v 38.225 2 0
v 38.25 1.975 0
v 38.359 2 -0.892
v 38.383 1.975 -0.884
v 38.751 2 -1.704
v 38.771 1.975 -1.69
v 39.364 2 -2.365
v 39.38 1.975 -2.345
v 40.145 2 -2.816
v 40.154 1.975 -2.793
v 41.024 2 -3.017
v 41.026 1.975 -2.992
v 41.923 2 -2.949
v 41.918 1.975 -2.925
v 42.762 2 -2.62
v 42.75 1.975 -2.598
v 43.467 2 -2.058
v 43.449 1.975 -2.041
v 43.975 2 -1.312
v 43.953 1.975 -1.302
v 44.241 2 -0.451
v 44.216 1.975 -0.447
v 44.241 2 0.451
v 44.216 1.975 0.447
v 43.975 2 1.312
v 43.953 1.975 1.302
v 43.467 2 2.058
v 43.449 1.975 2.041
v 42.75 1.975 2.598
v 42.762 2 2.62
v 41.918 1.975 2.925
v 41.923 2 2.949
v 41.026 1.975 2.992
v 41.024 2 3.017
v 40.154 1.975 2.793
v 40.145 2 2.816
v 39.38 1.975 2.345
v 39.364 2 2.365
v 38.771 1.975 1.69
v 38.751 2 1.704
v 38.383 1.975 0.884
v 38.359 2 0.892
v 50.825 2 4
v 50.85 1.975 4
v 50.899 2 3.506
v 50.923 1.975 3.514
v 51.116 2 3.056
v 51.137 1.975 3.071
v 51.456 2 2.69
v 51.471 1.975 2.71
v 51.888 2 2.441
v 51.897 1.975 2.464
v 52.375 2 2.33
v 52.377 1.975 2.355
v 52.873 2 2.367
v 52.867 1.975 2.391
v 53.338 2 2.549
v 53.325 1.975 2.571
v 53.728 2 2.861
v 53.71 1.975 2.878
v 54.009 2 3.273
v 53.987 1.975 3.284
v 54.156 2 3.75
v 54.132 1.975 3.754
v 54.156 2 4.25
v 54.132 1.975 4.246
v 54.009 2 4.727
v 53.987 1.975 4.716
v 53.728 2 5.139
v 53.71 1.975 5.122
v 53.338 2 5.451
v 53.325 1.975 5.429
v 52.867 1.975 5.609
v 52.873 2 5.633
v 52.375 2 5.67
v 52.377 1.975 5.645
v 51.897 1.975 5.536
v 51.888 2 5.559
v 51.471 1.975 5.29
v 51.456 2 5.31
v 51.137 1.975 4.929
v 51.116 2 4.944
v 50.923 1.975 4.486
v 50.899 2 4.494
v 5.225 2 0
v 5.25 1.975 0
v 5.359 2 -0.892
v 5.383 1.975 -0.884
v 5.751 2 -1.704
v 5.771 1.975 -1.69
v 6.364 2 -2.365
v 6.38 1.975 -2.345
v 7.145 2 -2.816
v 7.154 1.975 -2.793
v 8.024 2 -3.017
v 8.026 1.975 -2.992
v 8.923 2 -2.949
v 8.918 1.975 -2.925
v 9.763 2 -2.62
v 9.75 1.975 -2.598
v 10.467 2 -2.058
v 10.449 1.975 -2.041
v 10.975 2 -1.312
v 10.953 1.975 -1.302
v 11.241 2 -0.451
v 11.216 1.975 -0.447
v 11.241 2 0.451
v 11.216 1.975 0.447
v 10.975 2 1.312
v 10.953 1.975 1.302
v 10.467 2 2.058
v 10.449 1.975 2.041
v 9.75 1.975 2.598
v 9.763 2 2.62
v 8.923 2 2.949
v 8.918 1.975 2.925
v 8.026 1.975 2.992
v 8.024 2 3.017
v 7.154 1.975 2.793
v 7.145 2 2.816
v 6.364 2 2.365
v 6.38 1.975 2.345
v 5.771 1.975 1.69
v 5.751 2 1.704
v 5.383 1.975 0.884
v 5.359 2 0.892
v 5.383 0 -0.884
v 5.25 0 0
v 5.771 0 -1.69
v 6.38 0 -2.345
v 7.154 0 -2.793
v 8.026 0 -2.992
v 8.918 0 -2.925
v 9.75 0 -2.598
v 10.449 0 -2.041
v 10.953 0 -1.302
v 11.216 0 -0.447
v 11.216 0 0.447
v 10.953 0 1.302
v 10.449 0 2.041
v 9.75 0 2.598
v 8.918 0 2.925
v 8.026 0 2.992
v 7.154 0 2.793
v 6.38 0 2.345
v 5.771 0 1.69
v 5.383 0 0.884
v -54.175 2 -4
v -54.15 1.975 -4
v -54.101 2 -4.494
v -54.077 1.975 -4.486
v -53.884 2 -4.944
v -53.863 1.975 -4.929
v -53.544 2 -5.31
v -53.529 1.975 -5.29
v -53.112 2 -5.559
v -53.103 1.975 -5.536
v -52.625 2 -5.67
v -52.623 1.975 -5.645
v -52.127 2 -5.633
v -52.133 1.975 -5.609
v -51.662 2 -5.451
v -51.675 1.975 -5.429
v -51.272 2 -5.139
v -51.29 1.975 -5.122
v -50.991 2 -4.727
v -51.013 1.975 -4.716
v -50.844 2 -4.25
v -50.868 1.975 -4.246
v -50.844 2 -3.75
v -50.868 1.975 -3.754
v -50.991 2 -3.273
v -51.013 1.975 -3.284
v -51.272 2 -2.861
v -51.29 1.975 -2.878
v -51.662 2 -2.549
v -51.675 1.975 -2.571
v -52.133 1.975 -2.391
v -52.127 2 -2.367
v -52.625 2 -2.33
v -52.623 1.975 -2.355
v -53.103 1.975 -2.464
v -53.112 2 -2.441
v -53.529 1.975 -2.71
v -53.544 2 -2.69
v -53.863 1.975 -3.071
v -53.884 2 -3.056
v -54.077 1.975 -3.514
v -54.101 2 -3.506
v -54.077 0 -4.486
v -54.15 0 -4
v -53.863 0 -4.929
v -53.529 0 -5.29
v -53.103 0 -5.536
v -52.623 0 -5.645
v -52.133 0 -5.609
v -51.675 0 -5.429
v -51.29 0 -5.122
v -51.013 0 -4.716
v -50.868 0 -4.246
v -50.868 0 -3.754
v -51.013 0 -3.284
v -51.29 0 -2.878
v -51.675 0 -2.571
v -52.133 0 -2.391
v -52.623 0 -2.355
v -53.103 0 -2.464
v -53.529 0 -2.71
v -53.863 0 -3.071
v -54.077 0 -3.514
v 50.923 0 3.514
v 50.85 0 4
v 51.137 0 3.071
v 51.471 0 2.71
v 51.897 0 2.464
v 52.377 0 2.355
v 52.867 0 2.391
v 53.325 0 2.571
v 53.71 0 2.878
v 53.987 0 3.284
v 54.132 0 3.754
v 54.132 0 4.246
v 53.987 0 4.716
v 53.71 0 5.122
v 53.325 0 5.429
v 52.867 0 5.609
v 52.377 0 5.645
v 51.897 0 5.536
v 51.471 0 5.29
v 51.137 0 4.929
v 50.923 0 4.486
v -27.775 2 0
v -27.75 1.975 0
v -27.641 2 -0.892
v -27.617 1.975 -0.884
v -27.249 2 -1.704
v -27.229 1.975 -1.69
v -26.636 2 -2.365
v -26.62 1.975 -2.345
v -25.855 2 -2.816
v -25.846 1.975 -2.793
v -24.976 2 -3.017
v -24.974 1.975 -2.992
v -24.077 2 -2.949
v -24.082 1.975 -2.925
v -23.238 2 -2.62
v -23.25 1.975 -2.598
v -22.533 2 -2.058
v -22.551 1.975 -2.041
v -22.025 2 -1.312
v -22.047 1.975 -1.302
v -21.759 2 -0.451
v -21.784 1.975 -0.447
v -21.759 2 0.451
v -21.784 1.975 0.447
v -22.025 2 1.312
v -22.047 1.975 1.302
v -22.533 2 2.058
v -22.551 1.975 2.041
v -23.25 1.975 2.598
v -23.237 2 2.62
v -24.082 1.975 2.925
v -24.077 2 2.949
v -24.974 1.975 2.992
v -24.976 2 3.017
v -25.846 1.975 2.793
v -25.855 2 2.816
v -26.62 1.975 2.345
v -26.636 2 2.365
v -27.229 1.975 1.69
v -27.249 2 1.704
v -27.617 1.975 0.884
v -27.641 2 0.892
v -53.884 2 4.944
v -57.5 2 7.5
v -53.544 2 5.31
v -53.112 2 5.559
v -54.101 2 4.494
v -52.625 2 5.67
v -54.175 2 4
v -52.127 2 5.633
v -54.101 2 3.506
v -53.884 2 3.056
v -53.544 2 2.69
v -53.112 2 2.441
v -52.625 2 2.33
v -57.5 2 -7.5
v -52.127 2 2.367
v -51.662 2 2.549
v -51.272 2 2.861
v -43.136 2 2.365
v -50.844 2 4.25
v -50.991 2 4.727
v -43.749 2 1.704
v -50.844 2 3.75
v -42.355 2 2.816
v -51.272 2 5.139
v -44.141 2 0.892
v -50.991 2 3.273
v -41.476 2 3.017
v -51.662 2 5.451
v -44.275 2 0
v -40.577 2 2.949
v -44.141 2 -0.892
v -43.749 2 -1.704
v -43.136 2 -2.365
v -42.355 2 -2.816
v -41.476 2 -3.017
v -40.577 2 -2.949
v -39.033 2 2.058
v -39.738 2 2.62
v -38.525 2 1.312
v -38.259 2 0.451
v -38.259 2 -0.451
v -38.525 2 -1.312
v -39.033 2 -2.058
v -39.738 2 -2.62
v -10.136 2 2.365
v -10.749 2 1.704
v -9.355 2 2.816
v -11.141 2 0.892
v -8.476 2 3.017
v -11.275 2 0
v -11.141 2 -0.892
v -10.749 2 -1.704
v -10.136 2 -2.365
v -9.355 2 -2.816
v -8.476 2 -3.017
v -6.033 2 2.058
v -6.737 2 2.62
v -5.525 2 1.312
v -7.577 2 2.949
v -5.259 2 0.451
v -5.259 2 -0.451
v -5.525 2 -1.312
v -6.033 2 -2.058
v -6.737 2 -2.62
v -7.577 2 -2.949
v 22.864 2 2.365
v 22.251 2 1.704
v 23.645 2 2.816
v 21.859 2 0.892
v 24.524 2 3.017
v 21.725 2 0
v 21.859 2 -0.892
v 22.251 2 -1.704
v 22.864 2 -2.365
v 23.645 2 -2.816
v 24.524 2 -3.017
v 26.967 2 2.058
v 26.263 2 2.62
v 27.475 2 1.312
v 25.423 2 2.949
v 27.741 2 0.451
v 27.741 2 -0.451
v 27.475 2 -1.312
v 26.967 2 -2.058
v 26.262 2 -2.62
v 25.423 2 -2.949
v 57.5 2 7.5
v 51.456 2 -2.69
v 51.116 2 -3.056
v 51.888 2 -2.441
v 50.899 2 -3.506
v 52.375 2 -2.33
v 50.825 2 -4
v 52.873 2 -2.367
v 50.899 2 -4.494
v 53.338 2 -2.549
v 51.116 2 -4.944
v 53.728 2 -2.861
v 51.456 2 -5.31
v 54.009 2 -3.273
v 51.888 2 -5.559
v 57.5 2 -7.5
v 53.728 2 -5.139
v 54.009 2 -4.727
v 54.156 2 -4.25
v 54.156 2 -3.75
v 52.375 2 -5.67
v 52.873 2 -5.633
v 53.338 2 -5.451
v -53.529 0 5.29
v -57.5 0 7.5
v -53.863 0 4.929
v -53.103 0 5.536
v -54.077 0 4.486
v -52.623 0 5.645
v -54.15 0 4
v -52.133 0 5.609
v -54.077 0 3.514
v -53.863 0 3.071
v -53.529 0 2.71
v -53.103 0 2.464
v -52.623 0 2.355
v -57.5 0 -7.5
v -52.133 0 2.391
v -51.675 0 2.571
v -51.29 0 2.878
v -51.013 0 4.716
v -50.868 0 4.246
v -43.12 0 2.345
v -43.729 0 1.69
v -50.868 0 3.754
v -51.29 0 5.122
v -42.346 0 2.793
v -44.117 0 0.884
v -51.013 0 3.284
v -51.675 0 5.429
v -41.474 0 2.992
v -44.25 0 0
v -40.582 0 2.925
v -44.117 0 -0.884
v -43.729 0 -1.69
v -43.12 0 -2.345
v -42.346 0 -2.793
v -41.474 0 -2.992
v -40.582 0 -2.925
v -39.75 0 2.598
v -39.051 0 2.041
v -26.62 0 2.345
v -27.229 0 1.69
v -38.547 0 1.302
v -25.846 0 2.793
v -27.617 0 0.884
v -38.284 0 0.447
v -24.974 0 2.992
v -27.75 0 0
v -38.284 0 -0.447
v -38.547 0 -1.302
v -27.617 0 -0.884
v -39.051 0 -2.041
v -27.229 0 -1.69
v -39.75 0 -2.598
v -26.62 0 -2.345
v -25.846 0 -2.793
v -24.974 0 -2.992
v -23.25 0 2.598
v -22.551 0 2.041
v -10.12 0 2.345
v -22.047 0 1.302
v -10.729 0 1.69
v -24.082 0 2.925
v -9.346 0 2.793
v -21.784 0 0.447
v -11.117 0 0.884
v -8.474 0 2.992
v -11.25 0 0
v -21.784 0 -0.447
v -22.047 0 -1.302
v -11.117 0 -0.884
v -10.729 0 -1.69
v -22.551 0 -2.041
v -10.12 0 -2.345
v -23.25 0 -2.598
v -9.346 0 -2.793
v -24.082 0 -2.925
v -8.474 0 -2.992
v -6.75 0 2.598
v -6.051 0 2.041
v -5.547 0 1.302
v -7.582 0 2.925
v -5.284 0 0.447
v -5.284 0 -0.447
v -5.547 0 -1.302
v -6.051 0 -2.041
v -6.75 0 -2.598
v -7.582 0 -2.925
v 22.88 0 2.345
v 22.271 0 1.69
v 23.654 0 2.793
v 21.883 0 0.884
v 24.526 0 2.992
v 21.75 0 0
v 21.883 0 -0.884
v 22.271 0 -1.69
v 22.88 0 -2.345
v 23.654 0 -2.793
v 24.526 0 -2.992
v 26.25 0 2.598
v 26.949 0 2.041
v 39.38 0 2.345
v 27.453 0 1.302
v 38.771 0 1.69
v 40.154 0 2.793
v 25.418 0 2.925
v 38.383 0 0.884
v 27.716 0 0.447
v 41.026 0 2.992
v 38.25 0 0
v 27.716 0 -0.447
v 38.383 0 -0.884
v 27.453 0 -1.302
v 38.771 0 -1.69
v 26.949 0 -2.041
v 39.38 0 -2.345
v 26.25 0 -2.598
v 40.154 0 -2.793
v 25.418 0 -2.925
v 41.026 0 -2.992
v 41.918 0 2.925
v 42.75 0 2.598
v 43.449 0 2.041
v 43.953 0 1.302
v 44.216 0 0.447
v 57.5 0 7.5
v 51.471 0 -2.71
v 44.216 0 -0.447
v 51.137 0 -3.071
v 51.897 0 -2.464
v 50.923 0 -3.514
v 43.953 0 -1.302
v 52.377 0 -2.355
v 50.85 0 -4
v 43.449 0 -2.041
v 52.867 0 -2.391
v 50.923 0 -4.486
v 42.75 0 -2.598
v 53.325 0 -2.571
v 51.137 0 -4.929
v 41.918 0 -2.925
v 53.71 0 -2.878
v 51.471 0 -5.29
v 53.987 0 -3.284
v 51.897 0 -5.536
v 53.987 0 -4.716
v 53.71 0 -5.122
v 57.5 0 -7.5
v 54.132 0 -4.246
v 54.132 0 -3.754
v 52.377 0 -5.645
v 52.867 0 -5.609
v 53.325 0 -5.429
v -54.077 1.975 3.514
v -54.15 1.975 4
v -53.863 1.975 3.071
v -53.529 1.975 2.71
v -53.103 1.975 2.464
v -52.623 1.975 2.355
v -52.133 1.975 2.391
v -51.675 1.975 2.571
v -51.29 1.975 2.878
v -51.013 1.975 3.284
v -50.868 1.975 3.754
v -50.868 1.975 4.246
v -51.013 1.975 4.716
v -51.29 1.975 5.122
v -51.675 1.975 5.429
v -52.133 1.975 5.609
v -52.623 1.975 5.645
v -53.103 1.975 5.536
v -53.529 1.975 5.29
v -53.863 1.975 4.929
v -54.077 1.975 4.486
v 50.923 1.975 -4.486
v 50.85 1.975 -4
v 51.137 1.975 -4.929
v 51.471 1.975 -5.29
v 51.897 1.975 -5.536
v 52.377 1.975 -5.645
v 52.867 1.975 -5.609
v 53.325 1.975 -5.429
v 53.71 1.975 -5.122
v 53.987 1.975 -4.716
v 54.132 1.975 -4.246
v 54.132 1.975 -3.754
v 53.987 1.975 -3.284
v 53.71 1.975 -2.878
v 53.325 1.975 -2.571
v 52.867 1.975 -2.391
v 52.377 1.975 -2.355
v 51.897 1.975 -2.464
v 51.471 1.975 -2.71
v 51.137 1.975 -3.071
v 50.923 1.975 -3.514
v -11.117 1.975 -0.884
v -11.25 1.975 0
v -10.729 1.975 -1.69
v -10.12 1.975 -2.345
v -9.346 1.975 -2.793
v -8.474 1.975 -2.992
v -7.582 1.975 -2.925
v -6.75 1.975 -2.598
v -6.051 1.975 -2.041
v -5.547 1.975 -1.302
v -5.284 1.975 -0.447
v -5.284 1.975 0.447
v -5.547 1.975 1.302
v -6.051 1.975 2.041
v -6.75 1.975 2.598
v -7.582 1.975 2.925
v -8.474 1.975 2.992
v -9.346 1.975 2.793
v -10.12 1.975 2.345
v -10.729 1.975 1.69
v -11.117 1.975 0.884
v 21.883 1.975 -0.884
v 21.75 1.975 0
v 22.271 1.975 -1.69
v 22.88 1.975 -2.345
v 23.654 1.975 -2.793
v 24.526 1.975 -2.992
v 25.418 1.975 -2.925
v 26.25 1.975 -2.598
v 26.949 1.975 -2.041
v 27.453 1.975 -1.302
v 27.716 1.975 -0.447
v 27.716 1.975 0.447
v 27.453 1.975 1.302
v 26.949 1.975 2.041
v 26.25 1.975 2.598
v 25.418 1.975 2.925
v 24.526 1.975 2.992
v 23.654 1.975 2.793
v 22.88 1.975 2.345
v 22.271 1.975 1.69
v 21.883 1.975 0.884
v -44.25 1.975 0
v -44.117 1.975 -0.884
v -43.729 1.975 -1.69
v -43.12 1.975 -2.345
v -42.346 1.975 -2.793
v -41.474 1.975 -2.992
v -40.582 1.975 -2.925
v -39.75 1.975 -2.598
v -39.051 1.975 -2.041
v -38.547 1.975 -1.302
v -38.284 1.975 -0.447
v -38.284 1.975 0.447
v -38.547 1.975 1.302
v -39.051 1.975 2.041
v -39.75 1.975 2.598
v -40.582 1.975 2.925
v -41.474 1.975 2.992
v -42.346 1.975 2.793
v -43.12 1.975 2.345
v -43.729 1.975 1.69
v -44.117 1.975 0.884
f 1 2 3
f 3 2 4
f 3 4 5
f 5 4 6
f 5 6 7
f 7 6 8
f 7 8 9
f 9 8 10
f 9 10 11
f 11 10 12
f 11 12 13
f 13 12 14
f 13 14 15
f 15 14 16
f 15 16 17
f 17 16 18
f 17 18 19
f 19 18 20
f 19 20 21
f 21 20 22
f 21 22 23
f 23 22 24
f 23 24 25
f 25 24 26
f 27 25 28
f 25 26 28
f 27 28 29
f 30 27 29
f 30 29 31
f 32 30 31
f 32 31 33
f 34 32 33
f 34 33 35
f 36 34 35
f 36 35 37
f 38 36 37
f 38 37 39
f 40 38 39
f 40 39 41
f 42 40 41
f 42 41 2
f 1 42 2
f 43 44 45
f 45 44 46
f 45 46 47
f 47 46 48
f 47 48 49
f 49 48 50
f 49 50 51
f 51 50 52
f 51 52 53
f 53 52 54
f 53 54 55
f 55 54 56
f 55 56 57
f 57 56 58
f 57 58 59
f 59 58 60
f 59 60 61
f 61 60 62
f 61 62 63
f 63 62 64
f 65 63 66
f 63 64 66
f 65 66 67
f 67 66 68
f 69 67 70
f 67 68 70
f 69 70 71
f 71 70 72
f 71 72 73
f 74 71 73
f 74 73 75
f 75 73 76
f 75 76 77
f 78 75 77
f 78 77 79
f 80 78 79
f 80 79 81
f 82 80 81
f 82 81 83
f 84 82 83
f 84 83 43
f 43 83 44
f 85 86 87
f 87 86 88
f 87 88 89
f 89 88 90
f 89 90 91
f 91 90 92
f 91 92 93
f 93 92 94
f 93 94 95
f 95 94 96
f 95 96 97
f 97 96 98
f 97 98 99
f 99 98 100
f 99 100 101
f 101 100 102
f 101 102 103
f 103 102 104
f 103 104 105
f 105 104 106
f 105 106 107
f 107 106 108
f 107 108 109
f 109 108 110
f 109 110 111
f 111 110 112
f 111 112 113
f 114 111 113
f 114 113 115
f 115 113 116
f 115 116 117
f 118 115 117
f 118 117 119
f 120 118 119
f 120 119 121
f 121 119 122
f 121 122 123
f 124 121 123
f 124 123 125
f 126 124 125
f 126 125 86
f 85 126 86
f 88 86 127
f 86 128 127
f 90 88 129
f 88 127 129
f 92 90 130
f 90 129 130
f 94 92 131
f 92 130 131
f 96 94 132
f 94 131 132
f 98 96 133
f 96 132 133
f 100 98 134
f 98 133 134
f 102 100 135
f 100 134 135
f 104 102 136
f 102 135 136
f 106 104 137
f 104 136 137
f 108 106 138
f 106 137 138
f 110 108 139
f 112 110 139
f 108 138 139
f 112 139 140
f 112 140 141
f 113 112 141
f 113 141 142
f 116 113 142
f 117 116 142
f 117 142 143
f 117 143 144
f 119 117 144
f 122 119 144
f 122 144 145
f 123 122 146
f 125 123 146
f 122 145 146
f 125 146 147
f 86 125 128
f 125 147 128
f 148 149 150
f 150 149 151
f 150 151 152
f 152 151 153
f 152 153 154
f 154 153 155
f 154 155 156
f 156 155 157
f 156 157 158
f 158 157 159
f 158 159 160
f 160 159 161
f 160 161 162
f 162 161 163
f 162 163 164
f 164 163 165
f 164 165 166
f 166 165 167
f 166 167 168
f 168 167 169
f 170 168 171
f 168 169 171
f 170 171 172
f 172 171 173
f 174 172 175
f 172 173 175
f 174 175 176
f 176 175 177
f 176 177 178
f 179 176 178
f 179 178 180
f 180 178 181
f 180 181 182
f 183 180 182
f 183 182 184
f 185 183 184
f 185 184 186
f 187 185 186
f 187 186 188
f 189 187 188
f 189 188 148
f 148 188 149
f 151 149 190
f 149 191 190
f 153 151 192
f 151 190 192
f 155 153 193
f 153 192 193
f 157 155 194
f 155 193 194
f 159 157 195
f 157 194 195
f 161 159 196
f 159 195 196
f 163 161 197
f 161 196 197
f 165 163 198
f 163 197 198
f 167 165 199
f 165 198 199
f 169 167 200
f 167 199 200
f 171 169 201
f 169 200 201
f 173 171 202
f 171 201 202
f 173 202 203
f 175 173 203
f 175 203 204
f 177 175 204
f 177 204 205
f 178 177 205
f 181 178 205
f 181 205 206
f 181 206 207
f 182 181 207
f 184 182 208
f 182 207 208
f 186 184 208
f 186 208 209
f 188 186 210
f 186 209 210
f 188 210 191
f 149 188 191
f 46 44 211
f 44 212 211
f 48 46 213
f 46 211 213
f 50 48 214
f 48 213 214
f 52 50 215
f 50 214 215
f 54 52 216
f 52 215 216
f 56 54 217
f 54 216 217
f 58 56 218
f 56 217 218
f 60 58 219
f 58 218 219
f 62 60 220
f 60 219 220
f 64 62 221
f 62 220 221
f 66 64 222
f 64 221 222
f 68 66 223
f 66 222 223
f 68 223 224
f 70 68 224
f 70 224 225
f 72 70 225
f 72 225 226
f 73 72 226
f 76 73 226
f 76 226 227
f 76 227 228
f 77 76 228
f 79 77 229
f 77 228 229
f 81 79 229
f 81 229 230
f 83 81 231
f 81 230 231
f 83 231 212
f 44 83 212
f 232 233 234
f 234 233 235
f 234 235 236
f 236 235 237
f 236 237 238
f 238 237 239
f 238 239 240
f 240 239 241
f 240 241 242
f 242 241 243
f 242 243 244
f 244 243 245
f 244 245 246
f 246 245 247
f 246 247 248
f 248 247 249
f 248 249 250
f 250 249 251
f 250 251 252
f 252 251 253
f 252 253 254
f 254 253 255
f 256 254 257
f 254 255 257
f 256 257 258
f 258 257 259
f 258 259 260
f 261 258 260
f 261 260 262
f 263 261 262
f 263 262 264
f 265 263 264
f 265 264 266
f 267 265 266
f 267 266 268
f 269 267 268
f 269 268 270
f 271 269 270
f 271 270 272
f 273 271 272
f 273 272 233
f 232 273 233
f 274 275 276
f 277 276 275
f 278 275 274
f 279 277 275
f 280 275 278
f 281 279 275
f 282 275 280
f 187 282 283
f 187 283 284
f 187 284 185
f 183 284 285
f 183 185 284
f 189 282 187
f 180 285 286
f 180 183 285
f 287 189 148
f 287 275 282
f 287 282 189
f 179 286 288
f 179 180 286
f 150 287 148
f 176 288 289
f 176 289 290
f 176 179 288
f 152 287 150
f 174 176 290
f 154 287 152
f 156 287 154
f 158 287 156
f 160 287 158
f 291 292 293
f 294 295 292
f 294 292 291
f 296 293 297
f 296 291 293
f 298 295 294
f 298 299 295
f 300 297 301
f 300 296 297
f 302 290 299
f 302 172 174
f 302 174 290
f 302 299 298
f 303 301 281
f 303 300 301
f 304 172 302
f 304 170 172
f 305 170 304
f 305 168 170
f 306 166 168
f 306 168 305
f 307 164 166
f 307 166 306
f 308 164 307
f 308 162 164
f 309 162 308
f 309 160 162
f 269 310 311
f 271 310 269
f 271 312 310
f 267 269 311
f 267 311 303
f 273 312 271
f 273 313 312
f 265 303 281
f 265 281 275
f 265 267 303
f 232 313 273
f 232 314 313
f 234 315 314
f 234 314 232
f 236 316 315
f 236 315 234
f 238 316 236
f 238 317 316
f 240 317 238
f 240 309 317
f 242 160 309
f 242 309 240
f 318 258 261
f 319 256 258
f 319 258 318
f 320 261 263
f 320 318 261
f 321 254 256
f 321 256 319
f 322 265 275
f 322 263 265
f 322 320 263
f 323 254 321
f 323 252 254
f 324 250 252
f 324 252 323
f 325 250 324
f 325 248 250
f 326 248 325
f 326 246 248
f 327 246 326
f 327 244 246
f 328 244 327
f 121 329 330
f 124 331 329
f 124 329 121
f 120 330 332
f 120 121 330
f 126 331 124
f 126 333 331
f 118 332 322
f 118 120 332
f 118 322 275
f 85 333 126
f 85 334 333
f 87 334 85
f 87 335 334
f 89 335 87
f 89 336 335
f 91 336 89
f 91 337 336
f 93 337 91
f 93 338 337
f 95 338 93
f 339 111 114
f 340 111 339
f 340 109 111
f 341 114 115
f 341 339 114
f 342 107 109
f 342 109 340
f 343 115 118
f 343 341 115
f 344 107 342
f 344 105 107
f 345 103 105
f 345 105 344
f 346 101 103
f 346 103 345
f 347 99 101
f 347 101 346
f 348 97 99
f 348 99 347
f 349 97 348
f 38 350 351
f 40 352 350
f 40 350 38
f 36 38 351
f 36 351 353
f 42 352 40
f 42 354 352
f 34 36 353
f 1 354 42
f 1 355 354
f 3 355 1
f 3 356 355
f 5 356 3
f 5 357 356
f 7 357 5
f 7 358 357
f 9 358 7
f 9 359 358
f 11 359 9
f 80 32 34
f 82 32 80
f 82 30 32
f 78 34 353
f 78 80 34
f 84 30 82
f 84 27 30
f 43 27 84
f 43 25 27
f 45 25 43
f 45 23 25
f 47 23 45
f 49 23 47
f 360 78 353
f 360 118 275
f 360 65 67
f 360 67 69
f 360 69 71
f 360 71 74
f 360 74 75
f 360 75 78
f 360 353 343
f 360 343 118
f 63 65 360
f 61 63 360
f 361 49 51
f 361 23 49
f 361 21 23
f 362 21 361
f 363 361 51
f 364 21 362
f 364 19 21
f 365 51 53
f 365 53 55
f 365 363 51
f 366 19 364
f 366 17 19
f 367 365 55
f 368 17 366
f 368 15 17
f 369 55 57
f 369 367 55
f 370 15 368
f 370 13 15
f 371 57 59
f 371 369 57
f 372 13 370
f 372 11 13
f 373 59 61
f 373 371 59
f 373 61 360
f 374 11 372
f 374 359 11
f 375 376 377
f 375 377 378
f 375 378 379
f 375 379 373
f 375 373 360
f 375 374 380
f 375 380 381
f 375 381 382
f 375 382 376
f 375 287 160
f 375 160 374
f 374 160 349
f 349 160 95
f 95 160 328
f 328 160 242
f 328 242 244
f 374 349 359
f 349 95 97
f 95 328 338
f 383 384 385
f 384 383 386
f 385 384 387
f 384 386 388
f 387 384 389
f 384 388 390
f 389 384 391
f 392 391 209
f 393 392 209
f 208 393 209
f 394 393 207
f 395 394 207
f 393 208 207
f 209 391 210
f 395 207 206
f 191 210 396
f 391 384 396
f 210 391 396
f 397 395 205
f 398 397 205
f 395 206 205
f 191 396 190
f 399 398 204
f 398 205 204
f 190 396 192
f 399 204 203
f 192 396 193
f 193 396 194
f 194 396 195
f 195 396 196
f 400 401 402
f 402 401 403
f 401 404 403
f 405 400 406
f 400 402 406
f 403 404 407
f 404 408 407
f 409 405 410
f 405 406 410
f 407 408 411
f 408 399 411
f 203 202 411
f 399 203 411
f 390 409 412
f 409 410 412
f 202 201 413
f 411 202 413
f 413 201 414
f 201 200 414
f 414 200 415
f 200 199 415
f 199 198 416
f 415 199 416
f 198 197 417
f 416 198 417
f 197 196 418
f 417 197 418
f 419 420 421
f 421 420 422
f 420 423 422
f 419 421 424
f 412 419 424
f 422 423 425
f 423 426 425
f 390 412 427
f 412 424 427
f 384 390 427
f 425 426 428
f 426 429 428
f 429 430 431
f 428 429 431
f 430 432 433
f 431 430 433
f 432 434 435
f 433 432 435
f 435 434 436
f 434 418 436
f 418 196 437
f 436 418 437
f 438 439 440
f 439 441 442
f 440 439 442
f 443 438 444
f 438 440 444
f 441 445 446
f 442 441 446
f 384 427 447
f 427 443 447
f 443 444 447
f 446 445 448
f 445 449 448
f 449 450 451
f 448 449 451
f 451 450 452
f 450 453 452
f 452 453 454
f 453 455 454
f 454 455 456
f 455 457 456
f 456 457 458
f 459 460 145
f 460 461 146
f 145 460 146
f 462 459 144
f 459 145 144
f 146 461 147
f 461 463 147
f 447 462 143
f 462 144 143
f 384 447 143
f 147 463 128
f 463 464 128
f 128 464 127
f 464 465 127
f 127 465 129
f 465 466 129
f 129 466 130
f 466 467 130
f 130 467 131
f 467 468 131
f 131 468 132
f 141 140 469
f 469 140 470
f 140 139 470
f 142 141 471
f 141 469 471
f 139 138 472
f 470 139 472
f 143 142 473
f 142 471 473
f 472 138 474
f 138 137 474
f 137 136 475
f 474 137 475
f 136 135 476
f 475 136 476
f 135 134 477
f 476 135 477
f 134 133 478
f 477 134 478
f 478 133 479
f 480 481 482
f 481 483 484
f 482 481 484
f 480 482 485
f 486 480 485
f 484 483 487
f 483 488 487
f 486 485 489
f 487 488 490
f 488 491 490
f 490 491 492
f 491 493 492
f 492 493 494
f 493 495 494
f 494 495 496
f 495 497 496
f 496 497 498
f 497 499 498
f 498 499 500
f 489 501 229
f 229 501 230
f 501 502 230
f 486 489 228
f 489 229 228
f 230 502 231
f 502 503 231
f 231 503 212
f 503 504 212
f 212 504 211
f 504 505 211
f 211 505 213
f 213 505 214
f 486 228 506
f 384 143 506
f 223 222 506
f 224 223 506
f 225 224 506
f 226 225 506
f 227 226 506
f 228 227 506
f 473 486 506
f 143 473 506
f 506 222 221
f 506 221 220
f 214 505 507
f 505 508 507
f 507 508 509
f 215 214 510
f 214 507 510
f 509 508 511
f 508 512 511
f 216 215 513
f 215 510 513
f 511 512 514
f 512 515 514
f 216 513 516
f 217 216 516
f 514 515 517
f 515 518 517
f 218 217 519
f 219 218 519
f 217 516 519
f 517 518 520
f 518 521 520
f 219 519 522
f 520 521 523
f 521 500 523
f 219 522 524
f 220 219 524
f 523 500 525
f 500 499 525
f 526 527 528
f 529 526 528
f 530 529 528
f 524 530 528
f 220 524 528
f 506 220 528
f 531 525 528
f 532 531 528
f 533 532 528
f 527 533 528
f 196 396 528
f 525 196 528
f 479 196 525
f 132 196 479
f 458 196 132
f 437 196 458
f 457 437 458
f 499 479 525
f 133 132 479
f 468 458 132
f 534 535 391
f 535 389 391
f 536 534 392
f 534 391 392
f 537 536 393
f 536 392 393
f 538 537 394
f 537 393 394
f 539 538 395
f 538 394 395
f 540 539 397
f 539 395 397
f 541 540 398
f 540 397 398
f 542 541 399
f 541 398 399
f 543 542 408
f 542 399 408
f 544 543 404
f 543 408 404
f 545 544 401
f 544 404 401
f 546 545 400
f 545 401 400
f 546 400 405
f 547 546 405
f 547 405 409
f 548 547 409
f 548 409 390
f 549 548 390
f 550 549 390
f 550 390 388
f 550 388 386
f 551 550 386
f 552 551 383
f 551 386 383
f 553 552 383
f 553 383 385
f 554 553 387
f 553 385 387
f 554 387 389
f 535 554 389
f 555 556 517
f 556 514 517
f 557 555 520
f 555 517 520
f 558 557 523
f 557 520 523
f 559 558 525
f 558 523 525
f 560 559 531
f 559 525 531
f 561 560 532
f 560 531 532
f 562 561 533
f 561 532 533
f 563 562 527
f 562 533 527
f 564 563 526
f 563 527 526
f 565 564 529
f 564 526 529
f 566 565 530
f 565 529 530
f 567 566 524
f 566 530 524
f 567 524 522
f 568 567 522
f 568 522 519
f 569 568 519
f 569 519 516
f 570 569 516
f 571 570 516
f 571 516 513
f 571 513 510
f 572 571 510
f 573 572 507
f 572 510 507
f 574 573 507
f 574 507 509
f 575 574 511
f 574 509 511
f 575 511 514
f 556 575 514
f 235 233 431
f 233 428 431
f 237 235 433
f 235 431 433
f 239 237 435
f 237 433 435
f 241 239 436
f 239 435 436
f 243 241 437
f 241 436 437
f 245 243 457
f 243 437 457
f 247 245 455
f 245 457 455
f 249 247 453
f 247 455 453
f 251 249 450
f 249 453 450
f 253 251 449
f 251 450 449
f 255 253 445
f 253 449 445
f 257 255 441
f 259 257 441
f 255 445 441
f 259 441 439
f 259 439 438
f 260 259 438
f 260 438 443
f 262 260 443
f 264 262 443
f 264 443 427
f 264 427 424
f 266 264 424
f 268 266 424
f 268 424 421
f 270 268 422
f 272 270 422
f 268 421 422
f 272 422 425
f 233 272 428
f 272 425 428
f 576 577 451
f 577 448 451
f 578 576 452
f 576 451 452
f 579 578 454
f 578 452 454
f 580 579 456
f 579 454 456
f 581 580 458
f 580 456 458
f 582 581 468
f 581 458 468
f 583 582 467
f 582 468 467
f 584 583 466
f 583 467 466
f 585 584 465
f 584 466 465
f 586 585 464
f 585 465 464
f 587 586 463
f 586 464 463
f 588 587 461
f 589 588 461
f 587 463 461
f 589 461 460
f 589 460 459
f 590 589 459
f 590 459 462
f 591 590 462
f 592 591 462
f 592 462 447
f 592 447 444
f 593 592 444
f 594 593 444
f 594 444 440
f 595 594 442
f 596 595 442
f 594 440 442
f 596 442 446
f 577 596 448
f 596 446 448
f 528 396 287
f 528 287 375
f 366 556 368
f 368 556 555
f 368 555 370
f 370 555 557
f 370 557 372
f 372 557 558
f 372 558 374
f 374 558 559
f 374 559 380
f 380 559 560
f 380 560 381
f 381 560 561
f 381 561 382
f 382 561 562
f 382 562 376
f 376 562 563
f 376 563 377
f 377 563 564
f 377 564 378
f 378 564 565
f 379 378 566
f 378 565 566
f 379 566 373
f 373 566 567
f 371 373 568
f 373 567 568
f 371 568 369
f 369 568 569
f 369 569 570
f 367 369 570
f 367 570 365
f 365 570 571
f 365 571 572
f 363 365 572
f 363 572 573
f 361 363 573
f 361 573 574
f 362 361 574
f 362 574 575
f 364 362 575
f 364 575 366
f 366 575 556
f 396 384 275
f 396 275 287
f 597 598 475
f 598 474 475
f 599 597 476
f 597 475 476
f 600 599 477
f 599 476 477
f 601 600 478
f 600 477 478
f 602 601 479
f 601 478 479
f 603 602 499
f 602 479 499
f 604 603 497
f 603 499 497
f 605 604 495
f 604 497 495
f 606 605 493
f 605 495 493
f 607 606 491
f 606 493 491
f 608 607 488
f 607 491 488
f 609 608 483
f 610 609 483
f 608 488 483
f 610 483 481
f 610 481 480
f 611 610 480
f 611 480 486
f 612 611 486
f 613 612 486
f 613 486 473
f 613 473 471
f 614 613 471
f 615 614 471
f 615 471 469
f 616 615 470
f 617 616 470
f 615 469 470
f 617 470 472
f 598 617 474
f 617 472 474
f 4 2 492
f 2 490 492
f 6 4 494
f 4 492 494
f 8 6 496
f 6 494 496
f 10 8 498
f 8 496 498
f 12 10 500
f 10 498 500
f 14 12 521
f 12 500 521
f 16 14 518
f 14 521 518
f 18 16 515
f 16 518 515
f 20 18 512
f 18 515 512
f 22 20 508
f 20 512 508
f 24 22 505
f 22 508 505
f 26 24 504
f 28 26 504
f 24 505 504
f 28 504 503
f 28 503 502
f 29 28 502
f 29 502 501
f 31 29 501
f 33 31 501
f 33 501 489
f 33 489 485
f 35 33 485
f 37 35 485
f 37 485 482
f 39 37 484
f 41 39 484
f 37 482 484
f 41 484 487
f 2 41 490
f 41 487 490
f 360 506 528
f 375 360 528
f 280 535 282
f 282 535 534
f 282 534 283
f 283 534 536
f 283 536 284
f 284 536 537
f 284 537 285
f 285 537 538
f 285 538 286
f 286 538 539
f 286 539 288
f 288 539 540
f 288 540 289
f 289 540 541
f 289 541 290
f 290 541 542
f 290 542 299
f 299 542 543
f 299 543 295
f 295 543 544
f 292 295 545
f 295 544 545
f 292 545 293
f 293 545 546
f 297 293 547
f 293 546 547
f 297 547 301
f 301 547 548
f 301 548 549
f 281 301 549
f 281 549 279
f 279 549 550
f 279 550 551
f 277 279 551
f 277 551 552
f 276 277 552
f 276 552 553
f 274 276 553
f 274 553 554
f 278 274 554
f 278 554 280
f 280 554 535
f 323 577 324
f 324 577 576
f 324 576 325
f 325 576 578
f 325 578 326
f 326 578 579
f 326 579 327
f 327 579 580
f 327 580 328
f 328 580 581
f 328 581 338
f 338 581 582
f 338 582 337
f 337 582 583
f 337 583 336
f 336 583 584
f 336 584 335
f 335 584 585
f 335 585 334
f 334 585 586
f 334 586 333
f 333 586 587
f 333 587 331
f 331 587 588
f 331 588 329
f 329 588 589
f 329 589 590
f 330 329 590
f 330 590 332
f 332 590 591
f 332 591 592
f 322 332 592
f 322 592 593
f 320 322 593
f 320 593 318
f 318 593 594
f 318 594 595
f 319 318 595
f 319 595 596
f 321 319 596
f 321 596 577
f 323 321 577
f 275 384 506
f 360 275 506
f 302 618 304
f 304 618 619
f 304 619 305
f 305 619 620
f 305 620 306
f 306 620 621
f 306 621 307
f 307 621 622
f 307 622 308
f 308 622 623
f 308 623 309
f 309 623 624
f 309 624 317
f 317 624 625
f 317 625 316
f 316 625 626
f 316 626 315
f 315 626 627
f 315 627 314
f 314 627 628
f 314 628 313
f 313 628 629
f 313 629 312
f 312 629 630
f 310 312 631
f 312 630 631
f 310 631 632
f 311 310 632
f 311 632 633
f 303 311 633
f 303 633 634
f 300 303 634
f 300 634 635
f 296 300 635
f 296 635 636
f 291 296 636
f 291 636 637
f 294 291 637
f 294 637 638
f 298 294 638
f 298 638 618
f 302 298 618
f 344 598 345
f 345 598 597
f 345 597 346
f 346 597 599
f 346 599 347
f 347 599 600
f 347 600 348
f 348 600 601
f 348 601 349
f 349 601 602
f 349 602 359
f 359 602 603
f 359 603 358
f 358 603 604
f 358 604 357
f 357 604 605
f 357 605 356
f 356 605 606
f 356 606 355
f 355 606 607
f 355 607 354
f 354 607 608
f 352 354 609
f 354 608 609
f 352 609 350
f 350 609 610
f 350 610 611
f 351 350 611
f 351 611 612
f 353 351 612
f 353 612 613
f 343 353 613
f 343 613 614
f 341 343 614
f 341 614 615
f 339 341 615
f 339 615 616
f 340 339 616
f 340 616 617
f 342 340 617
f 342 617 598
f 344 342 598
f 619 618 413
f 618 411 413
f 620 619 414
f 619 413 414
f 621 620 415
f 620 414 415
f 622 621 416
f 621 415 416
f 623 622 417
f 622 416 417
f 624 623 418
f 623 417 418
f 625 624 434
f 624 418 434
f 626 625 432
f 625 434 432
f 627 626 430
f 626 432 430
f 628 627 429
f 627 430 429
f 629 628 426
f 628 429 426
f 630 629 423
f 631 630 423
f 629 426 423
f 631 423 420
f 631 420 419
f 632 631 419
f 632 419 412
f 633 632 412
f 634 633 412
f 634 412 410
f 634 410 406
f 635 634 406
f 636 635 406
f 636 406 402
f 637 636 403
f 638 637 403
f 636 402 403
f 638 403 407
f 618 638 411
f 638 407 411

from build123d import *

# Parameters (mm, degrees)
SKETCH1_W                            = 115
SKETCH1_H                            = 15
BOSS_EXTRUDE1_DEPTH                  = 2
F_3_3_3_3_DIAMETER_HOLE1_D           = 3.3
F_3_3_3_3_DIAMETER_HOLE1_DEPTH       = 15
F_3_3_3_3_DIAMETER_HOLE1_CSINK_D     = 3.35
F_3_3_3_3_DIAMETER_HOLE1_CSINK_ANGLE = 90
F_3_3_3_3_DIAMETER_HOLE1_TIP         = 0.991420021
F_6_0_6_DIAMETER_HOLE1_D             = 6
F_6_0_6_DIAMETER_HOLE1_DEPTH         = 15
F_6_0_6_DIAMETER_HOLE1_CSINK_D       = 6.05
F_6_0_6_DIAMETER_HOLE1_CSINK_ANGLE   = 90
F_6_0_6_DIAMETER_HOLE1_TIP           = 1.802581857


with BuildPart() as part:
    # Sketch1 → Boss-Extrude1 (new body)
    with BuildSketch(Plane(origin=(0, 0, 0), x_dir=(1, 0, 0), z_dir=(0, 1, 0))):
        Rectangle(SKETCH1_W, SKETCH1_H)
    extrude(amount=BOSS_EXTRUDE1_DEPTH)

    # Ø3.3 (3.3) Diameter Hole1
    with Locations(Plane(origin=(0, 2, 0), x_dir=(1, 0, 0), z_dir=(0, 1, 0))):
        with Locations((52.5, -4), (-52.5, 4), (-52.5, -4), (52.5, 4)):
            CounterSinkHole(F_3_3_3_3_DIAMETER_HOLE1_D / 2, F_3_3_3_3_DIAMETER_HOLE1_CSINK_D / 2, depth=F_3_3_3_3_DIAMETER_HOLE1_DEPTH, counter_sink_angle=F_3_3_3_3_DIAMETER_HOLE1_CSINK_ANGLE)
            with Locations((0, 0, -(F_3_3_3_3_DIAMETER_HOLE1_DEPTH + F_3_3_3_3_DIAMETER_HOLE1_TIP / 2))):  # 118° drill point
                Cone(0, F_3_3_3_3_DIAMETER_HOLE1_D / 2, F_3_3_3_3_DIAMETER_HOLE1_TIP, mode=Mode.SUBTRACT)

    # Ø6.0 (6) Diameter Hole1
    with Locations(Plane(origin=(0, 2, 0), x_dir=(1, 0, 0), z_dir=(0, 1, 0))):
        with Locations((-8.25, 0), (8.25, 0), (24.75, 0), (41.25, 0), (-24.75, 0), (-41.25, 0)):
            CounterSinkHole(F_6_0_6_DIAMETER_HOLE1_D / 2, F_6_0_6_DIAMETER_HOLE1_CSINK_D / 2, depth=F_6_0_6_DIAMETER_HOLE1_DEPTH, counter_sink_angle=F_6_0_6_DIAMETER_HOLE1_CSINK_ANGLE)
            with Locations((0, 0, -(F_6_0_6_DIAMETER_HOLE1_DEPTH + F_6_0_6_DIAMETER_HOLE1_TIP / 2))):  # 118° drill point
                Cone(0, F_6_0_6_DIAMETER_HOLE1_D / 2, F_6_0_6_DIAMETER_HOLE1_TIP, mode=Mode.SUBTRACT)


solid = part.part
